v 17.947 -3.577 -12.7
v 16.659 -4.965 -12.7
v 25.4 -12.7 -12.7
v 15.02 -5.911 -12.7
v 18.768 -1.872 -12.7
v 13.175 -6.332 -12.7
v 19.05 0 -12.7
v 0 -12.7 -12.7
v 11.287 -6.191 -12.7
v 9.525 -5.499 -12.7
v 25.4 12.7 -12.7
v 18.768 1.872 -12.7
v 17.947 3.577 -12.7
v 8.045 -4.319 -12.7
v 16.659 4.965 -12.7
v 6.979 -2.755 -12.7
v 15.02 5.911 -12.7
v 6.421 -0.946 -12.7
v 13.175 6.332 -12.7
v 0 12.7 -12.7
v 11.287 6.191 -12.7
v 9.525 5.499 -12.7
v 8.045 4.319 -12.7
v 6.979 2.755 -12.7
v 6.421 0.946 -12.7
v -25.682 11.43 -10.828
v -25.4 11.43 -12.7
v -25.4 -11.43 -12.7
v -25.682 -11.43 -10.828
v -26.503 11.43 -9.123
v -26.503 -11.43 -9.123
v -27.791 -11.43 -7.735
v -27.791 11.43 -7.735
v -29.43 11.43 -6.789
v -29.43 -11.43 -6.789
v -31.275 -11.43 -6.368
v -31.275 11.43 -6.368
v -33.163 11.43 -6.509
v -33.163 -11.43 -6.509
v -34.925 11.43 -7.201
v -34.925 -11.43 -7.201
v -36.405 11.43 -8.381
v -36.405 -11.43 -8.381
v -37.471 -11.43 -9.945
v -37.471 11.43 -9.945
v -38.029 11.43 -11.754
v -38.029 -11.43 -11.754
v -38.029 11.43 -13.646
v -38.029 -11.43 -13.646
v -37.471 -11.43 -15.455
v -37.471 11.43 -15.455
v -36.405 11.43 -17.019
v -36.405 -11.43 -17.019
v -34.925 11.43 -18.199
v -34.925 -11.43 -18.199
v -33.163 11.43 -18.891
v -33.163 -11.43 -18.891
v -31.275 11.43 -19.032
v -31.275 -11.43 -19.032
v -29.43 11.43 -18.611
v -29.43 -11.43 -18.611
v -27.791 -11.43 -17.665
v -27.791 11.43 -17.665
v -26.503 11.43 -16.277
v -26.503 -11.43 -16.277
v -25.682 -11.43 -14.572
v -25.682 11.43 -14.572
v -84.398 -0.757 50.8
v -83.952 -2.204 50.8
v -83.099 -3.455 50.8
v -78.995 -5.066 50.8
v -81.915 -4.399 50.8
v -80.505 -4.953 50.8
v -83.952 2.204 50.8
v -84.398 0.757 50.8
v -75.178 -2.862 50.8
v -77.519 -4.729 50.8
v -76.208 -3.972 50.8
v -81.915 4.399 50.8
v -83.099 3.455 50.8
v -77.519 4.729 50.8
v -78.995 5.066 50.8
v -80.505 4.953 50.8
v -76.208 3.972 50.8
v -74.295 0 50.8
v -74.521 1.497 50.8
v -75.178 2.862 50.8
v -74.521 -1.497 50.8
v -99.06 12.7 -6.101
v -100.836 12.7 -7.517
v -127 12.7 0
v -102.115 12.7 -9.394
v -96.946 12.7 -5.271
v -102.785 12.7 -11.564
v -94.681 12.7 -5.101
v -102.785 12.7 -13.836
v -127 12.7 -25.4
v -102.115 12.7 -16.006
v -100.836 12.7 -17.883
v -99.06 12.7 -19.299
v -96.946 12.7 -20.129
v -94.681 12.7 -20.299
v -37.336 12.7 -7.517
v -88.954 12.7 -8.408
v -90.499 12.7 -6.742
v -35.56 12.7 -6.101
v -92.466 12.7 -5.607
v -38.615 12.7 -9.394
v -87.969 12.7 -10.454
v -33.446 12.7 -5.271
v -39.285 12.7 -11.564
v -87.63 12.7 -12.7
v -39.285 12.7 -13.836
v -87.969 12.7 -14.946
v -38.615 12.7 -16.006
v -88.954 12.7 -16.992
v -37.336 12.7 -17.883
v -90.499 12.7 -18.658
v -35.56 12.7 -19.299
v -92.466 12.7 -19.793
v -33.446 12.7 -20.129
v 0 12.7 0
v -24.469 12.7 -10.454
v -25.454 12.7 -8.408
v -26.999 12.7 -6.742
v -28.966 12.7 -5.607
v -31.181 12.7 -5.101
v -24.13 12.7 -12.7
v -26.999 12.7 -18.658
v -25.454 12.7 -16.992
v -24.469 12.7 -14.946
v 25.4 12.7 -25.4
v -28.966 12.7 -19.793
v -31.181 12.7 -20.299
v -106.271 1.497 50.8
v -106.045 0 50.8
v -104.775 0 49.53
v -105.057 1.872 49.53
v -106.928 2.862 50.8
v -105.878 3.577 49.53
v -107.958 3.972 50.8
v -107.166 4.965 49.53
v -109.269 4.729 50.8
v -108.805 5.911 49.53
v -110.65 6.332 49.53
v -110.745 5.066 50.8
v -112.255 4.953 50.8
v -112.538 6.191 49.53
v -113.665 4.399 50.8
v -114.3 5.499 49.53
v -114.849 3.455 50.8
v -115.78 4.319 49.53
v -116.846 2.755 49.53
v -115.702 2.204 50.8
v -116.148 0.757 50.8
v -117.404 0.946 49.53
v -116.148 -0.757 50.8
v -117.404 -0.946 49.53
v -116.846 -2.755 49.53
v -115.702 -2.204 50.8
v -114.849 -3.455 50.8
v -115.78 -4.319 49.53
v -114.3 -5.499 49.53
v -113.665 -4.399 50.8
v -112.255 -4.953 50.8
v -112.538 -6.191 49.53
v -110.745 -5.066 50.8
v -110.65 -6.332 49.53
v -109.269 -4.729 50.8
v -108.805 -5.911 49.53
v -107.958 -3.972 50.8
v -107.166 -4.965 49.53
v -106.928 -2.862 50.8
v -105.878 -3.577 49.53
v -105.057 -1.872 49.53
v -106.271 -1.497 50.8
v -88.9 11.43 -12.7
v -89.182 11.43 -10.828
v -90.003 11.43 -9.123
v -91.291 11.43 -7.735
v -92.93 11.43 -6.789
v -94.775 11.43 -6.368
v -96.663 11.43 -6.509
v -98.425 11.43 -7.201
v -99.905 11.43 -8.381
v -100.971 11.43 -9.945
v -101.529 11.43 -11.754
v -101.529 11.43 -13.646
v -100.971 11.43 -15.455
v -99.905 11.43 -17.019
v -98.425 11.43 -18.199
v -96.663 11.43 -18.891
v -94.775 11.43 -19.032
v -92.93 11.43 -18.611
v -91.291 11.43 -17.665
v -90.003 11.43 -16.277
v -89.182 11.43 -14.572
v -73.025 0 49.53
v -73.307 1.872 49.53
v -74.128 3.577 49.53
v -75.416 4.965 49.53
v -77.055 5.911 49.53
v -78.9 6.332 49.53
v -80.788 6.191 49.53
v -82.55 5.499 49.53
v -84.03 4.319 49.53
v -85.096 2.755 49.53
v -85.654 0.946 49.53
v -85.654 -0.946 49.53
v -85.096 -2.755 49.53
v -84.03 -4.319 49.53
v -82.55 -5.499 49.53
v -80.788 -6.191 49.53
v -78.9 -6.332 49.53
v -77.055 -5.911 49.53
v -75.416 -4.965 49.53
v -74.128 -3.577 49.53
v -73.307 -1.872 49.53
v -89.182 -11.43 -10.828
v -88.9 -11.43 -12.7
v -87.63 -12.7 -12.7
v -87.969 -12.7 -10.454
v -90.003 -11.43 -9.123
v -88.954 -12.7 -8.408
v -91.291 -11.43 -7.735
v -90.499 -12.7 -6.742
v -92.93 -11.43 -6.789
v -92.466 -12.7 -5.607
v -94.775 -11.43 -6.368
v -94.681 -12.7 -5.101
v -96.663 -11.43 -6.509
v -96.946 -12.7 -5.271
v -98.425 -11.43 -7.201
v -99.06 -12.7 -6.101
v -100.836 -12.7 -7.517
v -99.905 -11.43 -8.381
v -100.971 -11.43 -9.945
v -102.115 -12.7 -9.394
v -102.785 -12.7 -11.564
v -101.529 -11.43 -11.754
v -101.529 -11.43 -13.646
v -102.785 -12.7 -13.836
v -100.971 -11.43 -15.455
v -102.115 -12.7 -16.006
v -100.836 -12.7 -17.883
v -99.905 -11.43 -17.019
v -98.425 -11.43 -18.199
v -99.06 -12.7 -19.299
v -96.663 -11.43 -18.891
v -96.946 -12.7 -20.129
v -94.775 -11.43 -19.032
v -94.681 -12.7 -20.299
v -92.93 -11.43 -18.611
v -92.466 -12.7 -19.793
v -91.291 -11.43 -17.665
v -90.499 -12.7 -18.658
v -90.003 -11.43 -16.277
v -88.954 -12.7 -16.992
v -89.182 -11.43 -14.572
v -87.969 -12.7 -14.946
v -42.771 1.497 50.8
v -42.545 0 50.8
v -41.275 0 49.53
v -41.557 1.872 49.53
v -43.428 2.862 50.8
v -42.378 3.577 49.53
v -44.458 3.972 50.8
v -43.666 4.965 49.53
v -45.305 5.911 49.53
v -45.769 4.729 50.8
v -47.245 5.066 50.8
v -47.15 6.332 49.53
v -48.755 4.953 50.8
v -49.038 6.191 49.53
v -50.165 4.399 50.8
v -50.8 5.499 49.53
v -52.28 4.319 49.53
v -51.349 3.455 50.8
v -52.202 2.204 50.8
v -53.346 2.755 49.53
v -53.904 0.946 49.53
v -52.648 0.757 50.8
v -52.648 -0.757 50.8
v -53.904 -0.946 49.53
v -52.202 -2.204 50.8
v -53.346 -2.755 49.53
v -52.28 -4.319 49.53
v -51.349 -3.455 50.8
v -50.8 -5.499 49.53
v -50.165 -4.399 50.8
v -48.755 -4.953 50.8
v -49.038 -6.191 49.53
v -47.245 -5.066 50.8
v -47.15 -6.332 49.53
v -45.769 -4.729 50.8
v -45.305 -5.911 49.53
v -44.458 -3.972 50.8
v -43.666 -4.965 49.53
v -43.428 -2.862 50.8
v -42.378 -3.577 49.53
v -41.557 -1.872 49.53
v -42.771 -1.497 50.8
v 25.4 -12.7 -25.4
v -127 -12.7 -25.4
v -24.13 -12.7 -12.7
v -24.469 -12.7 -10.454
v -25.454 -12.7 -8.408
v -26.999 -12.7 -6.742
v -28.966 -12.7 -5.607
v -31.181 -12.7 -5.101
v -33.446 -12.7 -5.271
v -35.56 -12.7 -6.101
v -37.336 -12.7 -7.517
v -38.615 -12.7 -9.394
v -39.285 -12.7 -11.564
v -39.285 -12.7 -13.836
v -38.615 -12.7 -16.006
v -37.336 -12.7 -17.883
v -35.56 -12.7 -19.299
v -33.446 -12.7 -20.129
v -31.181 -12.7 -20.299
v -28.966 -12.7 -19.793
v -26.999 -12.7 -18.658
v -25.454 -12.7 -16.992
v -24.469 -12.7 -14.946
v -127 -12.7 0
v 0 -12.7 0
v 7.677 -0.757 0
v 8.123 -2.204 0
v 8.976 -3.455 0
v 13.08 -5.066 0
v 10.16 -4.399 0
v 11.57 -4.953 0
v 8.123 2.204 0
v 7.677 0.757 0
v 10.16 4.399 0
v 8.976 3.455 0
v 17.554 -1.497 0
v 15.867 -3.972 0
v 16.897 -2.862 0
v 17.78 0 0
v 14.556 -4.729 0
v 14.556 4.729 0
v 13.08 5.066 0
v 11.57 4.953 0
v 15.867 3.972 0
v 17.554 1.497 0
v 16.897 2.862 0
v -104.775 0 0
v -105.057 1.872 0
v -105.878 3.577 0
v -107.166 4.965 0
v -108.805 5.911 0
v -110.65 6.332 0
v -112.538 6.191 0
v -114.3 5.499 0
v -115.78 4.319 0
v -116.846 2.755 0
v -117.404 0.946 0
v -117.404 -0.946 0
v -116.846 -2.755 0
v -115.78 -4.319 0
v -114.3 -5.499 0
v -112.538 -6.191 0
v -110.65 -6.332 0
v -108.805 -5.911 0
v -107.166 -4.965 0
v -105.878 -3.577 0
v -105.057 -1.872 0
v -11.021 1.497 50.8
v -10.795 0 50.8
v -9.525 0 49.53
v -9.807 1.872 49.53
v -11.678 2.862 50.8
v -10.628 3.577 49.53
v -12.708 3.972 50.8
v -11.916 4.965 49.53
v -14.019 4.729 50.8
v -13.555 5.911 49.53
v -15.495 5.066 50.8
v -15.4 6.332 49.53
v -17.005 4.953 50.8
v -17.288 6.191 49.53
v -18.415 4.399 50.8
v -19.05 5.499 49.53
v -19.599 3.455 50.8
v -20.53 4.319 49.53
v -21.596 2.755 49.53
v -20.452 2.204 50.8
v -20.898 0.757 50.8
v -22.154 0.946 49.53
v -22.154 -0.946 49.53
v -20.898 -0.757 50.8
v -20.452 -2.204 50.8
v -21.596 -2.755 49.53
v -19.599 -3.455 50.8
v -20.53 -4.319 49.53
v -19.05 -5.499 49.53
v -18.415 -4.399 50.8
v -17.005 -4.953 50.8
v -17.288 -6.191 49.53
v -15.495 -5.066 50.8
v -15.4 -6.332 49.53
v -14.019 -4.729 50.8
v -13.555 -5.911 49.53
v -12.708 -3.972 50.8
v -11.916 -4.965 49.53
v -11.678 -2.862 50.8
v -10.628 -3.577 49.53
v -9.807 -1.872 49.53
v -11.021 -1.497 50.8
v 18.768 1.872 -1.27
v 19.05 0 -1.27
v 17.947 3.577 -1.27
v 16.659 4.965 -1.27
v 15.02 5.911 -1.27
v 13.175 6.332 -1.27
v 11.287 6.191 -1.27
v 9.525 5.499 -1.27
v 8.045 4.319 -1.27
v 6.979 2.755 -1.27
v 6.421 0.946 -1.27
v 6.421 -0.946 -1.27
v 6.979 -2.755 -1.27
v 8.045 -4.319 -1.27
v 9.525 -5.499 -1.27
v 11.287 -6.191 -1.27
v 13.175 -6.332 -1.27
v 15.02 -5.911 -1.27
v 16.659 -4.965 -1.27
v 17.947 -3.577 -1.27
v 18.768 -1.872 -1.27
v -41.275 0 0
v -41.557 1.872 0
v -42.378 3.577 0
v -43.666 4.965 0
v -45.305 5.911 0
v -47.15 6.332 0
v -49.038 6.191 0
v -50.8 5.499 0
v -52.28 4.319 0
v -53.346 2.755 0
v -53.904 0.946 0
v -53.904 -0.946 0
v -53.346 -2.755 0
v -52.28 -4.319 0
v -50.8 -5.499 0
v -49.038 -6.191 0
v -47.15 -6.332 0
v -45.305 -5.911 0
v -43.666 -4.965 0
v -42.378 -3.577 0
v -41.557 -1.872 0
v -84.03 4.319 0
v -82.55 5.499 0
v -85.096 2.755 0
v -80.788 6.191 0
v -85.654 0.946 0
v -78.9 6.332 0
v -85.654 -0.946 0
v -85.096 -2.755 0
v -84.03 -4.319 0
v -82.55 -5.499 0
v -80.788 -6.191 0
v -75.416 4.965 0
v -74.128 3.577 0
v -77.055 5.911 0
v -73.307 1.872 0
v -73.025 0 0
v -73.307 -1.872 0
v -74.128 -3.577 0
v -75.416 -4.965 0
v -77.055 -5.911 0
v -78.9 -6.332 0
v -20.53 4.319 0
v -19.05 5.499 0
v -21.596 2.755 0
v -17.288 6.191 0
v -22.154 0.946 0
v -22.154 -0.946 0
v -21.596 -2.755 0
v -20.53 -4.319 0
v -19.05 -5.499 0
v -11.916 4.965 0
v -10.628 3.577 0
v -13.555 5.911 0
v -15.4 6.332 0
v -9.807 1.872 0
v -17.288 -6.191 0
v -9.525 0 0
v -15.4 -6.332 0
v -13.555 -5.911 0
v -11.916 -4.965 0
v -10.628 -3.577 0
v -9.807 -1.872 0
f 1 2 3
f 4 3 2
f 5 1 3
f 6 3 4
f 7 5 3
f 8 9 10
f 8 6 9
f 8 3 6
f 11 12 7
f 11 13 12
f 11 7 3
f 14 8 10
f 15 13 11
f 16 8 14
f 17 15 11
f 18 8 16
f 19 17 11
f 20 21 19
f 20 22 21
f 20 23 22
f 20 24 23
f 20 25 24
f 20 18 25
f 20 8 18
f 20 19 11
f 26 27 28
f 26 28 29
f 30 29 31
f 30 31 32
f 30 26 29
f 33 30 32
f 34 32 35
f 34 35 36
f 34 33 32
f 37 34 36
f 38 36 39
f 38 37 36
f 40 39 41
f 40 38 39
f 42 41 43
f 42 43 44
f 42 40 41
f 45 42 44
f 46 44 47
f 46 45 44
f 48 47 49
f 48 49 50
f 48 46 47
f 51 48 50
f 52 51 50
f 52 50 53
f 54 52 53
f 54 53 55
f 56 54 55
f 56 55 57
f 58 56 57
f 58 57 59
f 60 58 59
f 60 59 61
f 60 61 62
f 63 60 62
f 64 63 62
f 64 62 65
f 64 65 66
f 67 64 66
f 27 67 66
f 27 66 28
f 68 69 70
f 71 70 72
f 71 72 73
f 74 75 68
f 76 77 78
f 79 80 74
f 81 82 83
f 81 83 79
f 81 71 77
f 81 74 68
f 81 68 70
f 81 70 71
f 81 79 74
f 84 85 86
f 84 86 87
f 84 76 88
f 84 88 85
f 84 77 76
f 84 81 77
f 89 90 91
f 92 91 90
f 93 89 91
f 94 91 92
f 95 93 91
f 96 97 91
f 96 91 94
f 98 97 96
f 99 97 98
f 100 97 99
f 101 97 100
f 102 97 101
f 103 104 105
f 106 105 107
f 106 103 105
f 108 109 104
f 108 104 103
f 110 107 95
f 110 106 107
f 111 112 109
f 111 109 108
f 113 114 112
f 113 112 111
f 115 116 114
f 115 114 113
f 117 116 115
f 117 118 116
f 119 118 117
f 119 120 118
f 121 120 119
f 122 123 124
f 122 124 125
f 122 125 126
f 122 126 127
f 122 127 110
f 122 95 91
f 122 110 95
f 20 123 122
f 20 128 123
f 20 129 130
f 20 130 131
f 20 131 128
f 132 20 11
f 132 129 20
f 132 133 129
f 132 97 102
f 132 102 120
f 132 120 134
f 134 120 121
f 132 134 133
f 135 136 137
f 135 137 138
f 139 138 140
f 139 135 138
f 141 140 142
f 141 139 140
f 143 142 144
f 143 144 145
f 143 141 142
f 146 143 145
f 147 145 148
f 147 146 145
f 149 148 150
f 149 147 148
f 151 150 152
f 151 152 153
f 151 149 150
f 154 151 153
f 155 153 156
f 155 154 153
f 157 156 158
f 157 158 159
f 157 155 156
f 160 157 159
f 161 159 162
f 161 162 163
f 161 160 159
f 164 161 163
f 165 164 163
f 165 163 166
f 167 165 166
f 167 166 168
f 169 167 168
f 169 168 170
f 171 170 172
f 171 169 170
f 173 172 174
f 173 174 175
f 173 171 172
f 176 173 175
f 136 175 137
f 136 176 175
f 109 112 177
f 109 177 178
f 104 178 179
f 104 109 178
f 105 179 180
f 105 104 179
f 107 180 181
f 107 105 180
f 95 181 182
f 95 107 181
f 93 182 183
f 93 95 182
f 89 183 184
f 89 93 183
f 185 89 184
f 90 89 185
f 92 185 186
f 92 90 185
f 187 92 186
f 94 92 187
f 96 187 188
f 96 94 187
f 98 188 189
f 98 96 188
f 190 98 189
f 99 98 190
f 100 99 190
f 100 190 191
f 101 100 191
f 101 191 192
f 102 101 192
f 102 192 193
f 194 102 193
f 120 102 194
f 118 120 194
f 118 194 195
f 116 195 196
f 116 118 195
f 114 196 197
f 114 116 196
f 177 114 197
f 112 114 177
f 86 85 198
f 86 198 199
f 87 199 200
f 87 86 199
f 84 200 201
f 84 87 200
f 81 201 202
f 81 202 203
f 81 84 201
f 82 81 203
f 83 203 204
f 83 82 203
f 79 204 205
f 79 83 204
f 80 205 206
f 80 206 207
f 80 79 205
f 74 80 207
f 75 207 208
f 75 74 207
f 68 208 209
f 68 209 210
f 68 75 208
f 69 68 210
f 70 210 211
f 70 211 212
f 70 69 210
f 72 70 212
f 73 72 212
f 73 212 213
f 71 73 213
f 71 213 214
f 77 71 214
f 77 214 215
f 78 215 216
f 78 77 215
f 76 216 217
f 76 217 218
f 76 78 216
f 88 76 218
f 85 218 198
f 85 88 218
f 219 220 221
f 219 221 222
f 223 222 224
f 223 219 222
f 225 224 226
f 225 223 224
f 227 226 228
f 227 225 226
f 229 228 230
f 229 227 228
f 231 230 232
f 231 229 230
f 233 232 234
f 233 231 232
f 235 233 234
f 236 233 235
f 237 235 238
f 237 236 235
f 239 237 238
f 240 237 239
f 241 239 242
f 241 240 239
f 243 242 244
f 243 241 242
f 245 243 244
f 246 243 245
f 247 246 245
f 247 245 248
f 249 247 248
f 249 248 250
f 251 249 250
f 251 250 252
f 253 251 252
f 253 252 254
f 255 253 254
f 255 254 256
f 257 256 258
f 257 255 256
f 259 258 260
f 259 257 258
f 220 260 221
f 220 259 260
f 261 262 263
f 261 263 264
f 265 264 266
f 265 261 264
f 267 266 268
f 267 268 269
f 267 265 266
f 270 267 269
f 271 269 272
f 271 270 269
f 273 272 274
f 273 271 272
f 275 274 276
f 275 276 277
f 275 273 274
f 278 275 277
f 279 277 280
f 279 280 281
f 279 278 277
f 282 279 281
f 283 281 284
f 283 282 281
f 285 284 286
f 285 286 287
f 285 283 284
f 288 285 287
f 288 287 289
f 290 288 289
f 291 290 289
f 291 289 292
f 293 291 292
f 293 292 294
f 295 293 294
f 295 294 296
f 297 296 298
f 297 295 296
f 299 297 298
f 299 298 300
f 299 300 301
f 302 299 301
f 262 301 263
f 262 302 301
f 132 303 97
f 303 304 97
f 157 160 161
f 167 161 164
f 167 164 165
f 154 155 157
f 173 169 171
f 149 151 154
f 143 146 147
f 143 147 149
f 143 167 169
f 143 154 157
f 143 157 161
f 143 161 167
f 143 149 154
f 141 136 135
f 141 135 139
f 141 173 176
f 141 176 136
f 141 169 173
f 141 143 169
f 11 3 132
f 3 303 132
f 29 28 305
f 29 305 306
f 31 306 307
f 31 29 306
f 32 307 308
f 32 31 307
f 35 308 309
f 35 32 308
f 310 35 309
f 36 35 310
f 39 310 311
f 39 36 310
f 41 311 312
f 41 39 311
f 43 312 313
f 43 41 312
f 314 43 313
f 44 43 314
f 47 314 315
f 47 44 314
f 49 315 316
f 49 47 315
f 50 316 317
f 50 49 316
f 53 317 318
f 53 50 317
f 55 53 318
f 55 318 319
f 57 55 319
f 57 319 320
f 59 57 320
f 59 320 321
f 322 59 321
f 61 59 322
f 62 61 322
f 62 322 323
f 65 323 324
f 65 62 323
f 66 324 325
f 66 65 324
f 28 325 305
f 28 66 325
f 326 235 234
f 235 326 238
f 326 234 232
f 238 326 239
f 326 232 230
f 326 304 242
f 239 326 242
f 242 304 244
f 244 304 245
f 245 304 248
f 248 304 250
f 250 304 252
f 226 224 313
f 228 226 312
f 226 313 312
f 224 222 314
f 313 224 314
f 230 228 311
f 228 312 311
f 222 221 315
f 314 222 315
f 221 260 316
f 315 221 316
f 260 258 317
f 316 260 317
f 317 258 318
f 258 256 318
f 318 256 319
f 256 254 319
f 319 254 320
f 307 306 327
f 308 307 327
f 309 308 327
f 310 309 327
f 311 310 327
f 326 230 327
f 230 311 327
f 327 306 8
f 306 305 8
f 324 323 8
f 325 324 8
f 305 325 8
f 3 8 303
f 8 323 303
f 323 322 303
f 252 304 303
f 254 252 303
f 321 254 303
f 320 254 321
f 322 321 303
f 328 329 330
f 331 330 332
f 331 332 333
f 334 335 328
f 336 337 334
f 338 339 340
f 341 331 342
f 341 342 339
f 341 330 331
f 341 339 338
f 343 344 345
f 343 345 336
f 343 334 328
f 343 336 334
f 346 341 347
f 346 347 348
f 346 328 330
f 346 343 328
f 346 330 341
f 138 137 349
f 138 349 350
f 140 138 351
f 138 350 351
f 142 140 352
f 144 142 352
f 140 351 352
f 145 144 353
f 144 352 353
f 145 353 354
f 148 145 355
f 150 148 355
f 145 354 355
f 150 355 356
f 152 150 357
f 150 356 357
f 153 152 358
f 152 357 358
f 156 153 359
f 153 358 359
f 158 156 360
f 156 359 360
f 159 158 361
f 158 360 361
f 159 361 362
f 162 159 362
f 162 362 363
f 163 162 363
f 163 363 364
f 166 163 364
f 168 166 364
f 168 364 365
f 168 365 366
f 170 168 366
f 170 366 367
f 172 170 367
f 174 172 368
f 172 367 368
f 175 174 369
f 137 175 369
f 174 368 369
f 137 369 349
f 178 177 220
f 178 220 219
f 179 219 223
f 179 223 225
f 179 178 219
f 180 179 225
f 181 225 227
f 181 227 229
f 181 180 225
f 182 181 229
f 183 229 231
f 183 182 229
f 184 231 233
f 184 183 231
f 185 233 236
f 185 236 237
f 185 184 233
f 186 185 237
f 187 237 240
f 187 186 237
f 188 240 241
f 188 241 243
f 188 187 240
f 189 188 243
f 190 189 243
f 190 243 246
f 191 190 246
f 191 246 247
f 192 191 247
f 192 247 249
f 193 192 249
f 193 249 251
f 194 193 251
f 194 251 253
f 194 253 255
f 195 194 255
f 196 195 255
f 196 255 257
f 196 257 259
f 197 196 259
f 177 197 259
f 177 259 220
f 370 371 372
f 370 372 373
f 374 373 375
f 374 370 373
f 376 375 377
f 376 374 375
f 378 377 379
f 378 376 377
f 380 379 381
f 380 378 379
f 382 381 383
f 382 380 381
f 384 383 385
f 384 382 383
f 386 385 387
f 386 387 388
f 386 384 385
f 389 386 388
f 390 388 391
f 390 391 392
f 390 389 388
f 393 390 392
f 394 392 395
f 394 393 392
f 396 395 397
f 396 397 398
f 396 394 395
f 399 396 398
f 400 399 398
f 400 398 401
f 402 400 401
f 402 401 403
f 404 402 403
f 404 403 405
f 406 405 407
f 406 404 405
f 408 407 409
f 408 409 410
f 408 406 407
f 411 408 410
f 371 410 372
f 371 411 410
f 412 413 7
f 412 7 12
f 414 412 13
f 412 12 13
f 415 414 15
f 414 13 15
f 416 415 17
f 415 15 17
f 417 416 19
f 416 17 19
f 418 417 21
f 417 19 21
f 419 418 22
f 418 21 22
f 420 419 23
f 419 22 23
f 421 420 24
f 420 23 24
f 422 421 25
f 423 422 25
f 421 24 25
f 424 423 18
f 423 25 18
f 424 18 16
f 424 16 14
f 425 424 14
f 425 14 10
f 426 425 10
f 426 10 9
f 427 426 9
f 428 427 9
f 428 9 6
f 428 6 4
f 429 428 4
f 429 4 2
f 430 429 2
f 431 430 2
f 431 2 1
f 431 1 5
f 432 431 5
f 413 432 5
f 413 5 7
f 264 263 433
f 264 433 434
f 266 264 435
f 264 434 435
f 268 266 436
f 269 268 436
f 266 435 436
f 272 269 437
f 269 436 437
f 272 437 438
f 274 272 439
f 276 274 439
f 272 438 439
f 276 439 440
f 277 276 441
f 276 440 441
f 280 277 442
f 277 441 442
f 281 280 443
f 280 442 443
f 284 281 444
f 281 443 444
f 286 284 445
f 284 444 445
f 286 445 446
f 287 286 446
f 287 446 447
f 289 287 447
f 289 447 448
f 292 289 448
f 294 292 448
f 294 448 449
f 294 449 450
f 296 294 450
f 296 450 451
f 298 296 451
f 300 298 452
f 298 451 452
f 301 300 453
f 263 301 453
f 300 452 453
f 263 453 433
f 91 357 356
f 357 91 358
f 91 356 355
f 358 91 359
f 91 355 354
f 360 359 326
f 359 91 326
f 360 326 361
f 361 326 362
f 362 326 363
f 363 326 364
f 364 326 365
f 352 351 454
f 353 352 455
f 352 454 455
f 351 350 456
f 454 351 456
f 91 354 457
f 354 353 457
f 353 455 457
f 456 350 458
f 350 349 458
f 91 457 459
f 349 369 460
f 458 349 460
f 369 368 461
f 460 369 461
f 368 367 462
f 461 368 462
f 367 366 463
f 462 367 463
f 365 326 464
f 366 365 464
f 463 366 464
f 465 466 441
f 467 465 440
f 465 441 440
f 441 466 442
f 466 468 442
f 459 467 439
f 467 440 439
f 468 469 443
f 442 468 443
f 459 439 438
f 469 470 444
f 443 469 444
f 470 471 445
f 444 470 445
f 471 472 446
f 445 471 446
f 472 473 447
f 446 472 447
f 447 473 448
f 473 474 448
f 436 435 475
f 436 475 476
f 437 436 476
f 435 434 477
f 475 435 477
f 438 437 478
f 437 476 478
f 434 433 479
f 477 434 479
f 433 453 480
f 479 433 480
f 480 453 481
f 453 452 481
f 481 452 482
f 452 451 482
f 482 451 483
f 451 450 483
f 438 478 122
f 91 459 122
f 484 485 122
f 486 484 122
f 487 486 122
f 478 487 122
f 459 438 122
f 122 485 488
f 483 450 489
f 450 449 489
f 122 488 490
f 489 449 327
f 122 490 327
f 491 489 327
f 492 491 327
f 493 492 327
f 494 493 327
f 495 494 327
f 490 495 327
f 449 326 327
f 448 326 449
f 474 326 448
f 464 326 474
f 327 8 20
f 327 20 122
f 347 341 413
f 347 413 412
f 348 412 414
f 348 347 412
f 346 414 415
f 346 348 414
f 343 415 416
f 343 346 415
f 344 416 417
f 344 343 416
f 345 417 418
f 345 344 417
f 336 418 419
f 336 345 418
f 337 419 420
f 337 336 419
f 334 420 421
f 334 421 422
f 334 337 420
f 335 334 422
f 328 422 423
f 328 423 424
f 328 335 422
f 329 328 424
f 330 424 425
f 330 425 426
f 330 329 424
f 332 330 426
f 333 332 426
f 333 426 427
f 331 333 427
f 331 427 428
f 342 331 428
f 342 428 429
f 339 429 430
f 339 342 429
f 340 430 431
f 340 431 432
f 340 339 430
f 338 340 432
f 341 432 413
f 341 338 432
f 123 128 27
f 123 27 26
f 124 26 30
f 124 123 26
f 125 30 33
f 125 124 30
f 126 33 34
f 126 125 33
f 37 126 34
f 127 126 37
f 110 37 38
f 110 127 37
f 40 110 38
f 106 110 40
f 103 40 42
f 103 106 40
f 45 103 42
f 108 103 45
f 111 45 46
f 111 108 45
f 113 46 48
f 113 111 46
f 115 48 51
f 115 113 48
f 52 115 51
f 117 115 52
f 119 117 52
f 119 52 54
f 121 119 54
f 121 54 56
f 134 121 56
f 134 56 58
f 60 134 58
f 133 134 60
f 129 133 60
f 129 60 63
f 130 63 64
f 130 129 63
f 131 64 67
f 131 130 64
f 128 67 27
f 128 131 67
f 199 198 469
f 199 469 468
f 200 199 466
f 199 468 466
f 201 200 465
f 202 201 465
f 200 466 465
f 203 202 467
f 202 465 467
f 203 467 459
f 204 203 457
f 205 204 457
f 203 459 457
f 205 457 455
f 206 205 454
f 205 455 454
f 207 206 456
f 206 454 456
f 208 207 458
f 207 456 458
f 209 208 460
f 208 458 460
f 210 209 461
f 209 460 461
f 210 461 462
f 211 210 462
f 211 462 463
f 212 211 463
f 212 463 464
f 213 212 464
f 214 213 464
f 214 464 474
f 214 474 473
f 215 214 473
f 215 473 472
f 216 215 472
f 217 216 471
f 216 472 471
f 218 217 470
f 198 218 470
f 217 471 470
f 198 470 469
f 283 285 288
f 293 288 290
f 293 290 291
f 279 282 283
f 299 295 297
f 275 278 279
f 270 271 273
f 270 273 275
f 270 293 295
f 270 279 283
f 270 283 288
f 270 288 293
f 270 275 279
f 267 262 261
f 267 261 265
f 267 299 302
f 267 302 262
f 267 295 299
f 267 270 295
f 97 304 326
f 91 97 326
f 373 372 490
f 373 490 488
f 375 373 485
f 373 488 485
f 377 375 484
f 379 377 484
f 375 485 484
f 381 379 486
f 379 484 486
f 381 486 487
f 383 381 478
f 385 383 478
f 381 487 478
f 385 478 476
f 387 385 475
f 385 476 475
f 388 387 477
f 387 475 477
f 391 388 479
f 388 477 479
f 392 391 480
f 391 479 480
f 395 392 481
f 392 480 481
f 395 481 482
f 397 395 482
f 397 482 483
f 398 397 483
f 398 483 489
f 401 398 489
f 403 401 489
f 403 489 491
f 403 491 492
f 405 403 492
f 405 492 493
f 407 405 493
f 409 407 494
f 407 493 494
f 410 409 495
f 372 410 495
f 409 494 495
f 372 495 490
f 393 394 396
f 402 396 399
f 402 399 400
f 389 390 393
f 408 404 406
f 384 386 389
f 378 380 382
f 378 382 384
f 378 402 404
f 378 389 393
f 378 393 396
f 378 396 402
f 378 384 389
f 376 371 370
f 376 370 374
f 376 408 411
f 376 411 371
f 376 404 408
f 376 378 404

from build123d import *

# Parameters (mm, degrees)
F0_W      = 127
F0_H      = 25.4
F0_R      = 6.35
F1_DEPTH  = 12.7
F2_SIZE   = 1.27
F3_W      = 25.4
F3_H      = 6.35
F4_DEPTH  = 25.4
F5_R      = 6.35
F6_DEPTH  = 19.05
F7_DEPTH  = 6.35
F8_SIZE   = 1.27
F9_R      = 6.35
F10_DEPTH = 50.8
F11_SIZE  = 1.27


with BuildPart() as f1:
    # F0 (on Front) → F1 (new body, symmetric)
    with BuildSketch(Plane.XZ):
        with Locations((-63.5, -12.7)):
            Rectangle(F0_W, F0_H)
        with Locations((-95.25, -12.7)):
            Circle(F0_R, mode=Mode.SUBTRACT)
        with Locations((-31.75, -12.7)):
            Circle(F0_R, mode=Mode.SUBTRACT)
    extrude(amount=F1_DEPTH, both=True)

    # F2
    f2_edges = [f1.edges().sort_by_distance(p)[0] for p in [
        (-101.6, -12.7, -12.7),
        (-38.1, -12.7, -12.7),
        (-101.6, 12.7, -12.7),
        (-38.1, 12.7, -12.7),
    ]]
    chamfer(f2_edges, length=F2_SIZE)

    # F3 (on face) → F4 (join)
    with BuildSketch(Plane.YZ):
        with Locations((0, -22.225)):
            Rectangle(F3_W, F3_H)
    extrude(amount=F4_DEPTH)

    # F5 (on face) → F6 (join)
    with BuildSketch(Plane.XY.offset(-19.05)):
        with Locations((12.7, 0)):
            Circle(F5_R)
    extrude(amount=F6_DEPTH)

    # F7 (add): a face of the model
    f7_faces = [f1.faces().sort_by_distance(p)[0] for p in [
        (12.7, 12.3407897552, -19.05),
    ]]
    extrude(f7_faces, amount=F7_DEPTH)

    # F8
    f8_edges = [f1.edges().sort_by_distance(p)[0] for p in [
        (6.35, 0, 0),
    ]]
    chamfer(f8_edges, length=F8_SIZE)

    # F9 (on face) → F10 (join)
    with BuildSketch(Plane.XY):
        with Locations((-15.875, 0)):
            Circle(F9_R)
        with Locations((-47.625, 0)):
            Circle(F9_R)
        with Locations((-79.375, 0)):
            Circle(F9_R)
        with Locations((-111.125, 0)):
            Circle(F9_R)
    extrude(amount=F10_DEPTH)

    # F11
    f11_edges = [f1.edges().sort_by_distance(p)[0] for p in [
        (-22.225, 0, 50.8),
        (-53.975, 0, 50.8),
        (-85.725, 0, 50.8),
        (-117.475, 0, 50.8),
    ]]
    chamfer(f11_edges, length=F11_SIZE)


solid = f1.part
